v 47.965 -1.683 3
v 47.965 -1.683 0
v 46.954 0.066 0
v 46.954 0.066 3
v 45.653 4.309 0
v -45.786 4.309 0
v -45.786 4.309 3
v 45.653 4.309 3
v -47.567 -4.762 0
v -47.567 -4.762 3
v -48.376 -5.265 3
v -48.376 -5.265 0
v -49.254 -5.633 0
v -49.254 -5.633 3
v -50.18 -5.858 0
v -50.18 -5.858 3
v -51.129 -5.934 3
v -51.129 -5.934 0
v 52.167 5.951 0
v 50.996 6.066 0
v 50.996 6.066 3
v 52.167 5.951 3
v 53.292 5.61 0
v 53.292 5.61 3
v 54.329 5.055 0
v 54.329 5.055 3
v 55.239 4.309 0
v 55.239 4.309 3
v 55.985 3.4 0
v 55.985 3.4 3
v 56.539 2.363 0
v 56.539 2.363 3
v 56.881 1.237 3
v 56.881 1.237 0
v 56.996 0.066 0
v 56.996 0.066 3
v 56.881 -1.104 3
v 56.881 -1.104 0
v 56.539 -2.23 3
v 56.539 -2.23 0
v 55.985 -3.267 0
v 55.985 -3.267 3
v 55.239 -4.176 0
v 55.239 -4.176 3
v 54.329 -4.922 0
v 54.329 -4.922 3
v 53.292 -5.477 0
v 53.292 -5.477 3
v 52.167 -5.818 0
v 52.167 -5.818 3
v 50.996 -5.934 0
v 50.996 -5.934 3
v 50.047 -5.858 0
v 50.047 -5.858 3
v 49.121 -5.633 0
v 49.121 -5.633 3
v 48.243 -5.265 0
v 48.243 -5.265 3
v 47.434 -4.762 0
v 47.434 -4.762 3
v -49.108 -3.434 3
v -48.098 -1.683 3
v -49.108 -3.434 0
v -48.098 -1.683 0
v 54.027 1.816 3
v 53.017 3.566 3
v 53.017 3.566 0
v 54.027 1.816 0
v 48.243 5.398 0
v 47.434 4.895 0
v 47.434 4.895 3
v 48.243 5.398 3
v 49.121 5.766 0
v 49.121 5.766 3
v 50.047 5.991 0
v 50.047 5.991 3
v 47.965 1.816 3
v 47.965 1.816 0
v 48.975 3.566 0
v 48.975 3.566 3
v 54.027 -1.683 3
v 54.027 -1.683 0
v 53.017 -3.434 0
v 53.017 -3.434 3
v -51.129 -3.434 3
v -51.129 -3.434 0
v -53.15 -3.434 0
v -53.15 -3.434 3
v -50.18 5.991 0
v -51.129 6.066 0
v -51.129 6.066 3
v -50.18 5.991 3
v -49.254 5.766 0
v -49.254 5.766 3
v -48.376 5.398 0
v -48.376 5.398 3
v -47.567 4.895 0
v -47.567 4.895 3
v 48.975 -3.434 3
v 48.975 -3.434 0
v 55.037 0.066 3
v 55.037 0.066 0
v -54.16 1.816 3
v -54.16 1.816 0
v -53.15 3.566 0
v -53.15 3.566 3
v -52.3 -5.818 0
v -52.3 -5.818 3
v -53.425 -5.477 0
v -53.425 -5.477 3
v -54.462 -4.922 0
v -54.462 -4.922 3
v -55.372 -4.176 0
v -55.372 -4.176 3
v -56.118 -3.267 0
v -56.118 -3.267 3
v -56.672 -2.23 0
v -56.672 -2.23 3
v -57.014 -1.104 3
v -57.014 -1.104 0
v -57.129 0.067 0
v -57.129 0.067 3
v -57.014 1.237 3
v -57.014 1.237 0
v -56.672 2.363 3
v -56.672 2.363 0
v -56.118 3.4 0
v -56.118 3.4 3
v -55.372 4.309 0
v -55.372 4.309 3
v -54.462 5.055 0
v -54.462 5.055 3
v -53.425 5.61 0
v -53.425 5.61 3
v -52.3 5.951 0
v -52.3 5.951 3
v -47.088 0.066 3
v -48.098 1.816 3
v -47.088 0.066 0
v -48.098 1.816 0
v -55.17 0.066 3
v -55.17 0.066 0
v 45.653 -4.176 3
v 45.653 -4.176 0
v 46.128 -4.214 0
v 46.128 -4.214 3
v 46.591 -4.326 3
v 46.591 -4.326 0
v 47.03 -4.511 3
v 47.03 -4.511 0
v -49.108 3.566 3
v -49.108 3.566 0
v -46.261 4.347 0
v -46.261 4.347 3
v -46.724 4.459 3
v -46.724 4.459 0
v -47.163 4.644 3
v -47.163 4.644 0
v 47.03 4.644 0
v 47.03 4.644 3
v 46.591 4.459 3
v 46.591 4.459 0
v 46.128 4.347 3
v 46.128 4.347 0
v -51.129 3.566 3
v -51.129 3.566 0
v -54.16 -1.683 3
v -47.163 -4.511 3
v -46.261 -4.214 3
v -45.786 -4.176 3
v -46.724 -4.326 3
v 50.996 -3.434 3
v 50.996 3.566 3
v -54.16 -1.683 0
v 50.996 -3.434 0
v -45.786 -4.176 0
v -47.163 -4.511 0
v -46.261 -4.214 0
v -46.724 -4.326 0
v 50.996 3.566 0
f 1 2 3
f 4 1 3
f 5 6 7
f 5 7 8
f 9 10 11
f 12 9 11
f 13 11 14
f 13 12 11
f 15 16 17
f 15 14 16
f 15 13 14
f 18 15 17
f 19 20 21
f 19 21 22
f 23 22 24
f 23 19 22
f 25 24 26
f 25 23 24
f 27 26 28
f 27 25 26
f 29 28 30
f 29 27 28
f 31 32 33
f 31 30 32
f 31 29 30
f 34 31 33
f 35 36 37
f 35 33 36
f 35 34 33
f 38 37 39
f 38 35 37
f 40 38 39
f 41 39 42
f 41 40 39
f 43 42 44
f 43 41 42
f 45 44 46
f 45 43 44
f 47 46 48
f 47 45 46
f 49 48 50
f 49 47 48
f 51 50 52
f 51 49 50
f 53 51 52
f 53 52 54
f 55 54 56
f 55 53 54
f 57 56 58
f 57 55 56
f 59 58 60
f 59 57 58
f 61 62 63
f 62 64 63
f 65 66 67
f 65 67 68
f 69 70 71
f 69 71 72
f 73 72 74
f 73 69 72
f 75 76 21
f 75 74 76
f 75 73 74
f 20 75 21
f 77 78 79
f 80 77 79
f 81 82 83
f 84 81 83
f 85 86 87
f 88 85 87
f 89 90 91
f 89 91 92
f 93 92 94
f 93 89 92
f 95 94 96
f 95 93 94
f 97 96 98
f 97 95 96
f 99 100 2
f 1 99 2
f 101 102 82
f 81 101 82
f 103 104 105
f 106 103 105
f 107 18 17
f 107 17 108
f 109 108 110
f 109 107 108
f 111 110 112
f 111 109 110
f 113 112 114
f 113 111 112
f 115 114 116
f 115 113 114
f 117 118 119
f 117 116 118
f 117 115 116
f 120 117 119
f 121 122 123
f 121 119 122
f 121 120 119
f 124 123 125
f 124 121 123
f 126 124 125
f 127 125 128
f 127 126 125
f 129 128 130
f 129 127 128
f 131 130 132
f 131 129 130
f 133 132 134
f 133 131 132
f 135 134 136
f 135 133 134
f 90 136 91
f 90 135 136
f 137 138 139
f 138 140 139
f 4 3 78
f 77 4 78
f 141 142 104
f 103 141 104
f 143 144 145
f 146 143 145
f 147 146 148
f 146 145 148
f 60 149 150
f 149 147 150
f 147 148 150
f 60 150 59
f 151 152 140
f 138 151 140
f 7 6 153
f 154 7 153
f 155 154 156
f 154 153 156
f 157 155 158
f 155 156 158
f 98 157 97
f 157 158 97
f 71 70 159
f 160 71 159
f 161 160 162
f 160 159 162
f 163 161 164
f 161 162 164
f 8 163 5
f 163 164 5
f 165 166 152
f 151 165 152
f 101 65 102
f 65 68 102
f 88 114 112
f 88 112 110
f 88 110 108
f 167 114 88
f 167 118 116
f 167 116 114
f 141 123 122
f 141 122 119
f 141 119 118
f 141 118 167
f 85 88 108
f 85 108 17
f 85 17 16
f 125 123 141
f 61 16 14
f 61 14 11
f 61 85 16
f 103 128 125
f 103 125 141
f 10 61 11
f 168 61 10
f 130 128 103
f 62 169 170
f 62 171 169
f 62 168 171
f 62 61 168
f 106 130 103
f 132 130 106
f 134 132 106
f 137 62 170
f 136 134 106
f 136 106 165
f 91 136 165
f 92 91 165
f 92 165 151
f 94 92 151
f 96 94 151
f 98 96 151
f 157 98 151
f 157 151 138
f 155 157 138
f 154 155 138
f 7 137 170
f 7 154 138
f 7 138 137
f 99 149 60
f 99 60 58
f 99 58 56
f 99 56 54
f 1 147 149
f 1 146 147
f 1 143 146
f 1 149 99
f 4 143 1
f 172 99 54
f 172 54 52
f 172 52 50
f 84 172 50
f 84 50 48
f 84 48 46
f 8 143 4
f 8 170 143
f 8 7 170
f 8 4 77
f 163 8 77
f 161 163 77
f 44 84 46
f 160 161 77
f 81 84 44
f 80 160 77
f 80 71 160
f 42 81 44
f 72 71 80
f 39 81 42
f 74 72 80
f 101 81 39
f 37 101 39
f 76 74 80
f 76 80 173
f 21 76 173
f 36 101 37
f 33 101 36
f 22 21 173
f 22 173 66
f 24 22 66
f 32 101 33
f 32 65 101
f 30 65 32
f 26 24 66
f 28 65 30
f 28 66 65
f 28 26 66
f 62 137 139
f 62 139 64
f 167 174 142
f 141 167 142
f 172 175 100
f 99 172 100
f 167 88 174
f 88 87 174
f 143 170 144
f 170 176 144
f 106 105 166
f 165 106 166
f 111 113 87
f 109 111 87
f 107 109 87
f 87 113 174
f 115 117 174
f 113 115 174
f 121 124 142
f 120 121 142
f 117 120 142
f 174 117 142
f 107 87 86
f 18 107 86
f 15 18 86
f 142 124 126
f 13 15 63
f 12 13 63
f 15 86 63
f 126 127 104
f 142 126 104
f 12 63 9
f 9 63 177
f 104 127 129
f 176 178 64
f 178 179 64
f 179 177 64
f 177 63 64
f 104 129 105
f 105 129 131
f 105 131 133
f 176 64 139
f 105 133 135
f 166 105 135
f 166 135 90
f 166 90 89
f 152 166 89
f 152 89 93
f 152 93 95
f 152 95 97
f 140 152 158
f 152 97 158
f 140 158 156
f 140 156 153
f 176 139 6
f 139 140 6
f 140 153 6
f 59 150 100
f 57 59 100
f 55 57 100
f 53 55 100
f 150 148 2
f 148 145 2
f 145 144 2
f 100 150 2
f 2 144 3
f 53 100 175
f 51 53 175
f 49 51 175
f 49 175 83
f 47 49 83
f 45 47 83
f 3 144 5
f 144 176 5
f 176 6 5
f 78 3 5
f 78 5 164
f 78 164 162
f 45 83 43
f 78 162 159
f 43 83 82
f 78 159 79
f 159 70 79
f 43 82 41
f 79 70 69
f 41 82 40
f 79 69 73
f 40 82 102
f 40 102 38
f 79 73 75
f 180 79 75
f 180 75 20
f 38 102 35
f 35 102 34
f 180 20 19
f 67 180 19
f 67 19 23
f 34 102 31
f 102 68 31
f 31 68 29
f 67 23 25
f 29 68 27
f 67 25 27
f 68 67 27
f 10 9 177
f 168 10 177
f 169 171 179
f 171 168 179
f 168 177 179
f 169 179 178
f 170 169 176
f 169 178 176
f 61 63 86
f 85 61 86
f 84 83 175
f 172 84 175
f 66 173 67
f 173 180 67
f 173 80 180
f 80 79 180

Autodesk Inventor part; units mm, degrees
ref_plane "YZ Plane" through (0, 0, 0) normal (1, 0, 0) x (0, 1, 0)
ref_plane "XZ Plane" through (0, 0, 0) normal (0, 1, 0) x (-1, 0, 0)
ref_plane "XY Plane" through (0, 0, 0) normal (0, 0, 1) x (1, 0, 0)
sketch "Sketch1" plane through (0, 0, 0) normal (0, 0, 1) x (1, 0, 0)
  circle A0 centre (-51.129, 0.0665) radius 3.5
  circle A1 centre (50.996, 0.0665) radius 3.5
  arc A2 (-51.129, 6.0665) -> (-51.129, -5.9335) centre (-51.129, 0.0665) ccw
  arc A3 (50.996, -5.9335) -> (50.996, 6.0665) centre (50.996, 0.0665) ccw
  arc A4 (-51.129, -5.9335) -> (-47.5672, -4.7619) centre (-51.129, 0.0665) ccw
  line L0 (-51.129, 0.0665) -> (-46.8864, -4.1761) construction
  line L1 (-51.129, 0.0665) -> (-51.129, -5.9335) construction
  arc A5 (-47.5672, 4.895) -> (-51.129, 6.0665) centre (-51.129, 0.0665) ccw
  line L2 (-51.129, 0.0665) -> (-46.8864, 4.3092) construction
  line L3 (-51.129, 0.0665) -> (-51.129, 6.0665) construction
  arc A6 (50.996, 6.0665) -> (47.4342, 4.895) centre (50.996, 0.0665) ccw
  line L4 (50.996, 0.0665) -> (46.7533, 4.3092) construction
  line L5 (50.996, 0.0665) -> (50.996, 6.0665) construction
  arc A7 (47.4342, -4.7619) -> (50.996, -5.9335) centre (50.996, 0.0665) ccw
  line L6 (50.996, 0.0665) -> (46.7533, -4.1761) construction
  line L7 (50.996, 0.0665) -> (50.996, -5.9335) construction
  line L8 (-45.7864, 4.3092) -> (45.6533, 4.3092)
  line L9 (-45.7864, -4.1761) -> (45.6533, -4.1761)
  arc A8 (-47.5672, 4.895) -> (-45.7864, 4.3092) centre (-45.7864, 7.3092) ccw
  arc A9 (-45.7864, -4.1761) -> (-47.5672, -4.7619) centre (-45.7864, -7.1761) ccw
  arc A10 (45.6533, 4.3092) -> (47.4342, 4.895) centre (45.6533, 7.3092) ccw
  arc A11 (47.4342, -4.7619) -> (45.6533, -4.1761) centre (45.6533, -7.1761) ccw
  line L10 (-47.0876, 0.0665) -> (-49.1083, -3.4335)
  line L11 (-49.1083, -3.4335) -> (-53.1498, -3.4335)
  line L12 (-53.1498, -3.4335) -> (-55.1705, 0.0665)
  line L13 (-55.1705, 0.0665) -> (-53.1498, 3.5665)
  line L14 (-53.1498, 3.5665) -> (-49.1083, 3.5665)
  line L15 (-49.1083, 3.5665) -> (-47.0876, 0.0665)
  line L16 (55.0374, 0.0665) -> (53.0167, -3.4335)
  line L17 (53.0167, -3.4335) -> (48.9752, -3.4335)
  line L18 (48.9752, -3.4335) -> (46.9545, 0.0665)
  line L19 (46.9545, 0.0665) -> (48.9752, 3.5665)
  line L20 (48.9752, 3.5665) -> (53.0167, 3.5665)
  line L21 (53.0167, 3.5665) -> (55.0374, 0.0665)
  point P0 (0, 0)
  point P1 (46.7533, 4.3092)
  dimension "d0" = 7
  dimension "d1" = 7
  dimension "d2" = 102.125
  dimension "d3" = 6
  dimension "d4" = 6
  dimension "d5" = 45
  dimension "d6" = 45
  dimension "d7" = 45
  dimension "d8" = 45
  dimension "d9" = 3
extrude "Extrusion2" add sketch "Sketch1" along normal blind 3
properties part number "2P.03.01.17.ZW.AileronCoupler"
